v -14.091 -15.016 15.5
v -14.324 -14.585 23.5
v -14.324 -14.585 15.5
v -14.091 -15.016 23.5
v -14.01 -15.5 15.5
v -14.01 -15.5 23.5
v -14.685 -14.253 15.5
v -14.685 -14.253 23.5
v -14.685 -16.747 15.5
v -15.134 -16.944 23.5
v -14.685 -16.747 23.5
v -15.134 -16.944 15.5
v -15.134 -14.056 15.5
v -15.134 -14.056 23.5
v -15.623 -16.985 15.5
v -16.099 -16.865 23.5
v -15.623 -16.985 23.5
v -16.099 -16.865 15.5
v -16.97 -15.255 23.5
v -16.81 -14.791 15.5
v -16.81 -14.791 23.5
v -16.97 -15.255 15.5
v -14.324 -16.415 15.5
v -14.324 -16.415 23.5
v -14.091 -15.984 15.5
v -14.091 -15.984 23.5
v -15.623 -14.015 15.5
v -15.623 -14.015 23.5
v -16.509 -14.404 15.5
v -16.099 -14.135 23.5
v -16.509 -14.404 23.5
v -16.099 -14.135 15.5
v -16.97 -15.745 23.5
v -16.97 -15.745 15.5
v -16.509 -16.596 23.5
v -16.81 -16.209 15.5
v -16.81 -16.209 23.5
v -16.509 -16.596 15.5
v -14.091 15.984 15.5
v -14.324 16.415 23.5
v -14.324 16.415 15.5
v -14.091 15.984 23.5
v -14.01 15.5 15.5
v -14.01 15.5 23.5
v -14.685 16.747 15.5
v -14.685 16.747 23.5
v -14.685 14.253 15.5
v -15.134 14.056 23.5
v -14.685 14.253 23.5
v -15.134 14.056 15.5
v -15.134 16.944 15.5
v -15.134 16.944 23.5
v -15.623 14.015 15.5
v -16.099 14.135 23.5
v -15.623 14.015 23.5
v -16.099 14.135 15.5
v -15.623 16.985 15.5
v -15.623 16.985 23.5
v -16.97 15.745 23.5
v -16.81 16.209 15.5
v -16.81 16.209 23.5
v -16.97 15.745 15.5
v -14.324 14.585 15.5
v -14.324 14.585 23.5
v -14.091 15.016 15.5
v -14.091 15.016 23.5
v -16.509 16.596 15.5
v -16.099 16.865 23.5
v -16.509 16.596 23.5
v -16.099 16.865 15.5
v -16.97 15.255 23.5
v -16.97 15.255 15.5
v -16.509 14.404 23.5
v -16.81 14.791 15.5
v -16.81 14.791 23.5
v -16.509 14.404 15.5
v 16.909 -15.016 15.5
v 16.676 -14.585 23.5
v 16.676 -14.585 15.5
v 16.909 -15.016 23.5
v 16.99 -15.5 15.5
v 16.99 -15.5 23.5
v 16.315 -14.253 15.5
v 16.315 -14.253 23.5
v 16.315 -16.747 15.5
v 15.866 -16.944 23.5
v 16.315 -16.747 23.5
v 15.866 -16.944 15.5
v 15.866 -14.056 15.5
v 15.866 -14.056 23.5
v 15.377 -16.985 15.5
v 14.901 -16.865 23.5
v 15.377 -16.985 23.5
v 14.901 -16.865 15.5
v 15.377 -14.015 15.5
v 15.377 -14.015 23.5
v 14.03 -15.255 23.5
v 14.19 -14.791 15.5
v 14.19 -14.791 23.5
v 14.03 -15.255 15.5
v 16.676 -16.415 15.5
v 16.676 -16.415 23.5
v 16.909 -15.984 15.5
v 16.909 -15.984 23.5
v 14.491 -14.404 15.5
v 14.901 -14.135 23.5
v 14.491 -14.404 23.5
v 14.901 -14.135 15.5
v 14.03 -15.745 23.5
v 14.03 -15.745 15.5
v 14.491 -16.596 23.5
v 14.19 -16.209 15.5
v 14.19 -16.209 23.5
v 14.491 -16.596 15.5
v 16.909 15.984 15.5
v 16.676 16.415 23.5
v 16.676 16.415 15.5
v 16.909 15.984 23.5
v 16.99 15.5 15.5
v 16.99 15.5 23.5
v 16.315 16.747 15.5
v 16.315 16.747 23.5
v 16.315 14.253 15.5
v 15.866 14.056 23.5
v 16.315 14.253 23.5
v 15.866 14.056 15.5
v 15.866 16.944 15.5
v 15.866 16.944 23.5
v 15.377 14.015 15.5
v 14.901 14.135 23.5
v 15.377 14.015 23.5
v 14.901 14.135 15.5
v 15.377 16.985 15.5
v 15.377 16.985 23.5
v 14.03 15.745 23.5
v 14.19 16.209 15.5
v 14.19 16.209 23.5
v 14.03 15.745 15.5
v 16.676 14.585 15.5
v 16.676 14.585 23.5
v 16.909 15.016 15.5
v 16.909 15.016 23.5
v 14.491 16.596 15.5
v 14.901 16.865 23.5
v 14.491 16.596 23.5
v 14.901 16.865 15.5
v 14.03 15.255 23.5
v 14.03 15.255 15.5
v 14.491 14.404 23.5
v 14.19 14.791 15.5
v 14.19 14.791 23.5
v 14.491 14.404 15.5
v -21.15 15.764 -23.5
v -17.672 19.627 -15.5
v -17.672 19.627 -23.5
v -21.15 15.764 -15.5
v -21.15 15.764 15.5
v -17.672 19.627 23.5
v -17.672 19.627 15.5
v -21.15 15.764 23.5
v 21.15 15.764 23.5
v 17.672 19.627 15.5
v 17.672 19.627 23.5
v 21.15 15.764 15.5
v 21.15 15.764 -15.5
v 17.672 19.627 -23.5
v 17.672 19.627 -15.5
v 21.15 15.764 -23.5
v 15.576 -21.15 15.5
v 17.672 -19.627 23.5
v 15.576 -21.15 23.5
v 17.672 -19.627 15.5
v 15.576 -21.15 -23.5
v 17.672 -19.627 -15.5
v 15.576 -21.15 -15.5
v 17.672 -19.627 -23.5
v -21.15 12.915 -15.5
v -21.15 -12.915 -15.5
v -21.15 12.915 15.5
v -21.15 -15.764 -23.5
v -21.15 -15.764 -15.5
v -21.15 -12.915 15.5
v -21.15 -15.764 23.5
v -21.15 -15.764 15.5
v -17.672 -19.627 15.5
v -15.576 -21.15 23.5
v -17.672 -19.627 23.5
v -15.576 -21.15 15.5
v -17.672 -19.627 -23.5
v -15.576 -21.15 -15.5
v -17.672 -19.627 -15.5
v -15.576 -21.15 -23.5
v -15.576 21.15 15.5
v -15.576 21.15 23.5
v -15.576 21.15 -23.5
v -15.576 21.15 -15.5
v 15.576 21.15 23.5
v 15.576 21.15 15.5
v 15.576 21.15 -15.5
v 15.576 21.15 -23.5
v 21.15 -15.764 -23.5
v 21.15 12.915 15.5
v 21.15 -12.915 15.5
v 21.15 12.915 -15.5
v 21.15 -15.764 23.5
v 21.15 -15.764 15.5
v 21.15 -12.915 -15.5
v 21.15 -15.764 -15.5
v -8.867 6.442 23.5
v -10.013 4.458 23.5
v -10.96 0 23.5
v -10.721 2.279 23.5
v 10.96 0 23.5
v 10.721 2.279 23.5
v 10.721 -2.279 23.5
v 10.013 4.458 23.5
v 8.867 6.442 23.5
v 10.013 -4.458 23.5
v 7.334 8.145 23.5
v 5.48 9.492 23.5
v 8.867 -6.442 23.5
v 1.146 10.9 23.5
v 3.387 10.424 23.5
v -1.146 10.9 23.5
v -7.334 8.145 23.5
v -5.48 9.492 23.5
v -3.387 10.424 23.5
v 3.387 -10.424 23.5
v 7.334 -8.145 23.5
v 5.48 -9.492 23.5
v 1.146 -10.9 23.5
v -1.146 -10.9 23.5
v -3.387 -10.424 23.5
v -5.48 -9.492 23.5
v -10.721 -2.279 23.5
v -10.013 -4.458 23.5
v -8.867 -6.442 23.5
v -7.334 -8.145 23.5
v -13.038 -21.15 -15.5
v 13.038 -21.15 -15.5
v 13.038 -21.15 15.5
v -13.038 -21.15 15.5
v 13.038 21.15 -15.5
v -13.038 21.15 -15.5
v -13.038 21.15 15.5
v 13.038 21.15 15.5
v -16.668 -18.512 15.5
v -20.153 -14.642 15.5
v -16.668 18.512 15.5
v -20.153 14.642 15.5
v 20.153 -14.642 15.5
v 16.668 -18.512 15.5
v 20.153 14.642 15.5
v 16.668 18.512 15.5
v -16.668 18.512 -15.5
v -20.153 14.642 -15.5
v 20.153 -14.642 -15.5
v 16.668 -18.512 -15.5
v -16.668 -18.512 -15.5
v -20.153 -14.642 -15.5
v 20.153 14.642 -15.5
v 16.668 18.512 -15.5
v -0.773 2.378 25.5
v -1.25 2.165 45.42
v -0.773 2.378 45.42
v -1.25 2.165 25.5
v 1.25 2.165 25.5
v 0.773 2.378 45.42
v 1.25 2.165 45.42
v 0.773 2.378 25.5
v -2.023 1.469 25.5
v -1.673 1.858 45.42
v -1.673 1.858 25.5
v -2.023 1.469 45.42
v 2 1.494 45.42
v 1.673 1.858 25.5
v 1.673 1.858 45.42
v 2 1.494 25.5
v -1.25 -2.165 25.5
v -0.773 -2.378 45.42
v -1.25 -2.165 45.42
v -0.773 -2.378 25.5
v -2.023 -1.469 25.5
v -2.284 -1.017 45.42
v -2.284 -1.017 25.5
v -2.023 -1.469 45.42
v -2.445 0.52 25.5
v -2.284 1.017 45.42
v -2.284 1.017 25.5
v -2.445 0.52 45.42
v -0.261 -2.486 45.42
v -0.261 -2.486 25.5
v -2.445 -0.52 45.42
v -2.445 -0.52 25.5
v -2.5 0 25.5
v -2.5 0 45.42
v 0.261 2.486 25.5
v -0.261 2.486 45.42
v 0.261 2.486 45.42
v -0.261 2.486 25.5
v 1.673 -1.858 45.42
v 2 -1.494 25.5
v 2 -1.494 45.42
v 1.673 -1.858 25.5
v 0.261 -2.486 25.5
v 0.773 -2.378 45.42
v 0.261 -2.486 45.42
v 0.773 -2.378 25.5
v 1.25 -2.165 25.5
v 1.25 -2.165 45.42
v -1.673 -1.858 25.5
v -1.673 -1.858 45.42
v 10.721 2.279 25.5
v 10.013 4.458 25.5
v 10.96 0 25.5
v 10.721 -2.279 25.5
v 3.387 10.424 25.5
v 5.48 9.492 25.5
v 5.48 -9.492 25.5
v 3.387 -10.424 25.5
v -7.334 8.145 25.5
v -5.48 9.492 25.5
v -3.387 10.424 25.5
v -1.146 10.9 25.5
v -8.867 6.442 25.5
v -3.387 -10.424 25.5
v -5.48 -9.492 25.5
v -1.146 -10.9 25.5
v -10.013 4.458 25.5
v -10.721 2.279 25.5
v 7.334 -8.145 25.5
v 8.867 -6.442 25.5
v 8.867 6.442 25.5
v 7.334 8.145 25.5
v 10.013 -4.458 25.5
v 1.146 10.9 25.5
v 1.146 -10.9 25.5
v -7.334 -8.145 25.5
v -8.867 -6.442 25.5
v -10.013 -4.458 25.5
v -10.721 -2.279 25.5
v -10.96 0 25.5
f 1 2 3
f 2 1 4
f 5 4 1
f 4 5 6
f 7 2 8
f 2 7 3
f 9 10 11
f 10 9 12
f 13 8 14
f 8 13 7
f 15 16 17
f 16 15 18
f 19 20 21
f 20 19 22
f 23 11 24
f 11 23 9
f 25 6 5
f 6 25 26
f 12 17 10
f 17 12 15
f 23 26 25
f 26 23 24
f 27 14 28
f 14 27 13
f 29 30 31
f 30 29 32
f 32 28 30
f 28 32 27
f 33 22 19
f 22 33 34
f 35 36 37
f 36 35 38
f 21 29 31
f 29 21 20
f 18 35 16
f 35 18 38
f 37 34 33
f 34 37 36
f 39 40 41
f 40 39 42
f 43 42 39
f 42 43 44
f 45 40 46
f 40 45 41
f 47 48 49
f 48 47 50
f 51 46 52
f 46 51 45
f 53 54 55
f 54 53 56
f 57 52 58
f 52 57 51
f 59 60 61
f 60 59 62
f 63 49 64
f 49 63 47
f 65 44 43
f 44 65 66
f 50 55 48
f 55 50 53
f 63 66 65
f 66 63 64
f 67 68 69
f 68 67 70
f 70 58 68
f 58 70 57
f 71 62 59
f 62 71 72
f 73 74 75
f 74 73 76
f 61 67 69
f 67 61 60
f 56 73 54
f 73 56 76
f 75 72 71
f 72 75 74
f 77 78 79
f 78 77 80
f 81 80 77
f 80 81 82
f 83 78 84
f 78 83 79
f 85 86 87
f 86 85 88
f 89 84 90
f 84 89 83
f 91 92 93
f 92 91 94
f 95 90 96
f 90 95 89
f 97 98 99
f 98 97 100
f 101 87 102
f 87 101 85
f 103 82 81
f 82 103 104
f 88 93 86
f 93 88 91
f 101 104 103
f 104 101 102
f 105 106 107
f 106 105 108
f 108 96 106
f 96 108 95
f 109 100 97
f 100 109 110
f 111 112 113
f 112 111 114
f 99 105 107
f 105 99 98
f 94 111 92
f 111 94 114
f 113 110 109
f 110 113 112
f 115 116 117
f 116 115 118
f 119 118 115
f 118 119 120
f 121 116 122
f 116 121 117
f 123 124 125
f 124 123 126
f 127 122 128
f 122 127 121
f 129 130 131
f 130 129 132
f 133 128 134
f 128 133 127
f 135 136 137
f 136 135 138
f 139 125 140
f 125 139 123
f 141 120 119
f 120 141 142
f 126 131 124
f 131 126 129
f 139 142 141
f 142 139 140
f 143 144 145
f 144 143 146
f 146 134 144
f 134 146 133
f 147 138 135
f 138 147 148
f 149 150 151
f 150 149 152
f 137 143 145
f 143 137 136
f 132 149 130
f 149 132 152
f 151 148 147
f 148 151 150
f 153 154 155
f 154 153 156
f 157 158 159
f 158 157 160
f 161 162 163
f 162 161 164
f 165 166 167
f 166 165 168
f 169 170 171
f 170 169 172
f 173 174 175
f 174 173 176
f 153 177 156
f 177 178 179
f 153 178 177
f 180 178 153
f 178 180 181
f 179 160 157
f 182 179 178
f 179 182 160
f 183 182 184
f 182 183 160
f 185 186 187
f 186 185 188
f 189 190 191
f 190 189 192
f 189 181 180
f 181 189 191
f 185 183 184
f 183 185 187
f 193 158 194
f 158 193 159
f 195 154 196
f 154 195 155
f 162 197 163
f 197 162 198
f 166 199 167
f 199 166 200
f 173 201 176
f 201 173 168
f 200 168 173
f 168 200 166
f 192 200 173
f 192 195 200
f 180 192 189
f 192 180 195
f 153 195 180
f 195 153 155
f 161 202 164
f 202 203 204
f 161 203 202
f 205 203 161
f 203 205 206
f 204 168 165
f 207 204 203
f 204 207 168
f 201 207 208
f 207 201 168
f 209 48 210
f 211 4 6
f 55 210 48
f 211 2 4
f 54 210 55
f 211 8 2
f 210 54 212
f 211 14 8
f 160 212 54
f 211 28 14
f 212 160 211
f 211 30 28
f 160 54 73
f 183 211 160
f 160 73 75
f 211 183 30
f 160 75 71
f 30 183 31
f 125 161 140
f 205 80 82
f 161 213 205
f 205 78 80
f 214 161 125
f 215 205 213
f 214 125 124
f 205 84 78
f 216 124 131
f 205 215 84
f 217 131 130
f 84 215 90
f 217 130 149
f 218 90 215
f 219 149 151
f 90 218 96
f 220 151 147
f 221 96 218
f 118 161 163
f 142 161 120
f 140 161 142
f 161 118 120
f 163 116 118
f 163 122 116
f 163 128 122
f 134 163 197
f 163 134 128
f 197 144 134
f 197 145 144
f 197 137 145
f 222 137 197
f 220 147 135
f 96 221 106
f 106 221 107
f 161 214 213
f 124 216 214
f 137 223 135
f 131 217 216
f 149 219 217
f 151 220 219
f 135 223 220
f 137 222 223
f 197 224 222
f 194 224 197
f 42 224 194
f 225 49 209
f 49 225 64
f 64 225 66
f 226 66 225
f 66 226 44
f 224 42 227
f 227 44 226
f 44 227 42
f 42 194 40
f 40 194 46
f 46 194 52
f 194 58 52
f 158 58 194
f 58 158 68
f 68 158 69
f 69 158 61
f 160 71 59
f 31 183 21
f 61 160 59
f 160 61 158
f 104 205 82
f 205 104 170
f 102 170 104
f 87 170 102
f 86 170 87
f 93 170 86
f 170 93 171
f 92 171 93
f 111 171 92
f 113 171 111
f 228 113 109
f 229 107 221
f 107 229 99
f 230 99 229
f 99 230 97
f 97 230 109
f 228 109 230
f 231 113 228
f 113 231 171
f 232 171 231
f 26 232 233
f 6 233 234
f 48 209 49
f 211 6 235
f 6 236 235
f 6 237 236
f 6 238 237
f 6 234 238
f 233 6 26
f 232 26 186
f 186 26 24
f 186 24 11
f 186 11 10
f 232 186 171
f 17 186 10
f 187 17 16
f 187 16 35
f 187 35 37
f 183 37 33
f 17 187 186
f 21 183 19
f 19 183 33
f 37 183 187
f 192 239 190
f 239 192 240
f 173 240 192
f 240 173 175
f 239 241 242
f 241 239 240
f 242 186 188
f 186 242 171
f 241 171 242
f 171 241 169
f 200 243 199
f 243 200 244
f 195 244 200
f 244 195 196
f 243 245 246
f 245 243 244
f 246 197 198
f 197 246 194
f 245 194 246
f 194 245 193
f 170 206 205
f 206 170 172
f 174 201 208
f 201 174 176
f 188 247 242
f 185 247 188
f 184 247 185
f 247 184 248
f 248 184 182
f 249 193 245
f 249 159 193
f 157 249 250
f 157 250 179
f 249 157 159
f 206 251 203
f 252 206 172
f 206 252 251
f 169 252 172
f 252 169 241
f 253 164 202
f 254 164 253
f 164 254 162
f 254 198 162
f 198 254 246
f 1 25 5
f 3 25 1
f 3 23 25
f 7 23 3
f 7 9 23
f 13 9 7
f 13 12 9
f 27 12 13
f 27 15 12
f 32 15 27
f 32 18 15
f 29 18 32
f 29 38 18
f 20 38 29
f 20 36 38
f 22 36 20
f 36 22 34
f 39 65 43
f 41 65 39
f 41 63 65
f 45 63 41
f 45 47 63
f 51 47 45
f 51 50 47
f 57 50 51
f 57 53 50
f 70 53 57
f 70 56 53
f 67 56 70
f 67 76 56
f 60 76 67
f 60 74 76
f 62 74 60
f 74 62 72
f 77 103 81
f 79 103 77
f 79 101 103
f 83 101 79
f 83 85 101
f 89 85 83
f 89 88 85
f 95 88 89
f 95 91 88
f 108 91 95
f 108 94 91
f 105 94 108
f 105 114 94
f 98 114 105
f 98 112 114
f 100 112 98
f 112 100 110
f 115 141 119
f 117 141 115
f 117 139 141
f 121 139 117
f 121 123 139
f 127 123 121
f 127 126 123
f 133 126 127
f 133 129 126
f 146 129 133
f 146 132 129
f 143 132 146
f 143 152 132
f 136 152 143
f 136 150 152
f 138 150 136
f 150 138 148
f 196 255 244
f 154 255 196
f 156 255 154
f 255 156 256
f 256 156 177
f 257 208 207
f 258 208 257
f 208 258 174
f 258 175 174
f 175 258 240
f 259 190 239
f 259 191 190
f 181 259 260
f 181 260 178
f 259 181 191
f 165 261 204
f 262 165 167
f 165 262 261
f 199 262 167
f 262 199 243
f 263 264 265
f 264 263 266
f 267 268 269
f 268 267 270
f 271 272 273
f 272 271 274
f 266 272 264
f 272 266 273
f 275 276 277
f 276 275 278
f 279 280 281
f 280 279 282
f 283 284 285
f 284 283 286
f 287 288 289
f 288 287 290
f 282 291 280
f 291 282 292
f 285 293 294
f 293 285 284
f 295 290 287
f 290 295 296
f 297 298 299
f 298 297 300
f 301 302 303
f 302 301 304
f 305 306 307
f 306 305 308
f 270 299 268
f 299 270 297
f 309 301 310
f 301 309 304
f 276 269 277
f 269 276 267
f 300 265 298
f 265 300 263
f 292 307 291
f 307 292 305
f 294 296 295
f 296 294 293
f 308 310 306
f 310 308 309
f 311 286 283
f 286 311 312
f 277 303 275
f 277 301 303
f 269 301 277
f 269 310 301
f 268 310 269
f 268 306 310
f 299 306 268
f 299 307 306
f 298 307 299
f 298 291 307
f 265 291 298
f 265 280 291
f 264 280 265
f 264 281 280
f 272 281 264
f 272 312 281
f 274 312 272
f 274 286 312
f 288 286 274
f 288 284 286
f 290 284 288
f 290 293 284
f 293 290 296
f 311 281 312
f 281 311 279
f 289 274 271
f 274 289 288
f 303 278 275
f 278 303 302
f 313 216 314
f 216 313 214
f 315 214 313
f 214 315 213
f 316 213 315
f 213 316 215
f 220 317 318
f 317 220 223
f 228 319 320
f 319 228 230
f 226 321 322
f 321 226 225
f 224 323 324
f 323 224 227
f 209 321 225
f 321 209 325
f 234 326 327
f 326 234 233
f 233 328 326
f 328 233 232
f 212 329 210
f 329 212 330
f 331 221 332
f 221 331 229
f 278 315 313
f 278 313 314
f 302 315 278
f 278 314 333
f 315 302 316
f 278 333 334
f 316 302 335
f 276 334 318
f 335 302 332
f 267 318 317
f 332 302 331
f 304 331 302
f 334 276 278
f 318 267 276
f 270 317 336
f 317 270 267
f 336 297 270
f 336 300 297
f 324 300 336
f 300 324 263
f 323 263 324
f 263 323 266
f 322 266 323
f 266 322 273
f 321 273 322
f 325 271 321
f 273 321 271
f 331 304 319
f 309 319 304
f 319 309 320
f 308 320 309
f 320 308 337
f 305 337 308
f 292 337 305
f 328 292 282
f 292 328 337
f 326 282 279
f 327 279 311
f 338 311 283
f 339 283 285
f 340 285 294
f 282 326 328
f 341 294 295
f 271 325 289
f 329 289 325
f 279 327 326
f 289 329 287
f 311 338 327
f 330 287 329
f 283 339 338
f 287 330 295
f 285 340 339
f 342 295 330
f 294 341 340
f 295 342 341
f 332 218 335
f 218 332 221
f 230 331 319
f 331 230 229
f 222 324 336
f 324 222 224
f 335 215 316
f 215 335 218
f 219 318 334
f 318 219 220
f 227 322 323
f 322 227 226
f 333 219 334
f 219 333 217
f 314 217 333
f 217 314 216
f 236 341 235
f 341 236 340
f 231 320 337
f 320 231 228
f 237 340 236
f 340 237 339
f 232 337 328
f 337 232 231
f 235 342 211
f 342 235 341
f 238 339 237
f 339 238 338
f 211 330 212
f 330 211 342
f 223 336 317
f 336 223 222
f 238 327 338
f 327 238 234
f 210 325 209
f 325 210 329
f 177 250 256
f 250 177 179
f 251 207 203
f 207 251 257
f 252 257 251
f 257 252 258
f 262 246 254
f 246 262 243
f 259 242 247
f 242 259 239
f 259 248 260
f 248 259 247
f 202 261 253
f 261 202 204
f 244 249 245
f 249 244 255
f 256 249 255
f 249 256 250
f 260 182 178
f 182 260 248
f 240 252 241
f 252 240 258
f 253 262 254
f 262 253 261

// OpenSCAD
// file: ../press_fit.scad
include <config.scad>

module press_fit(d=0, h=0, center=false) {

	linear_extrude(height=h, center=center)
		minkowski() {
			square([d/3,d/3], center=true);
			circle(r=d/3);
		}
}

difference() {
	press_fit(d=20, h=24, center=true);
	cylinder(d=20, h=24+e, center=true);
}
// file: ../standard.scad
BOLT_D = [
	-1, //0 index is not used but reduces computation
	-1,
	-1,
	2.980,	//m3
	3.978,	//m4
	4.976,	//m5
	5.974,	//m6
	-1,
	7.972,	//m8
	-1,
	9.968,	//m10
	-1,
	11.966	//m12
];

NUT_D = [
	-1, //0 index is not used but reduces computation
	-1,
	-1,
	6.40,	//m3
	8.10,	//m4
	9.20,	//m5
	11.50,	//m6
	-1,
	15.00,	//m8
	-1,
	19.60,	//m10
	-1,
	22.10	//m12
];

NUT_H = [
	-1, //0 index is not used but reduces computation
	-1,
	-1,
	2.40,	//m3
	3.20,	//m4
	4.00,	//m5
	5.00,	//m6
	-1,
	6.50,	//m8
	-1,
	8.00,	//m10
	-1,
	10.00	//m12
];

NEMA_F = [	//faceplate size
	-1,-1,-1,-1,-1,-1,-1,-1,-1,-1,-1,
	28.0,	//Nema11
	-1,-1,
	35.6,	//Nema14
	-1,-1,
	42.3,	//Nema17
	-1,-1,-1,-1,-1,
	58.4	//Nema23
];

NEMA_H = [	//halved distance between holes
	-1,-1,-1,-1,-1,-1,-1,-1,-1,-1,-1,
	11.50,	//Nema11
	-1,-1,
	13.00,	//Nema14
	-1,-1,
	15.50,	//Nema17
	-1,-1,-1,-1,-1,
	23.57	//Nema23
];

NEMA_S = [	//shaft diameter
	-1,-1,-1,-1,-1,-1,-1,-1,-1,-1,-1,
	4.0,	//Nema11
	-1,-1,
	5.0,	//Nema14
	-1,-1,
	5.0,	//Nema17
	-1,-1,-1,-1,-1,
	6.35	//Nema23
];
// file: ../config.scad
include <standard.scad>

//render & print
$fs=.5;						//minimum arc segment
e=.1;						//extra length for manfold mesh (do not change)
tol=.5;						//xy compensation for small holes

				//
x=50*cos($t*360);			// printhead position
y=40*sin($t*360);			//
z=50*sin($t*360);

/*
x=0;			// printhead position
y=0;			//
z=0;
*/

wall=5/2;					//(some) thin wall thickness

//frame
f_t=10;						//frame thickness
f_x=200;
f_y=200;
f_z=65;
f_tr=8;						//corner threaded rods ISO diameter 
fy_ko=2;					//keepout between frame and x_carriage

//microswitch
ms_h=6;						//height
ms_l=13;					//length
ms_t=6;						//thickness

//motors
ab_motor=17;				//xy motors
ab_motor_l=47;				//xy motors length
z_motor=17;					//z motor
z_motor_l=47;				//z motor length
z_h=100;
z_h_extra=16.5;

//x
x_d=15;						//bearing diameter
x_l=24;						//bearing length
x_s=8;						//shaft diameter
x_fan=30;					//hotend fan diameter
x_blower=35;				//blower fan diameter
x_fans_m=6;					//fan and blower mount holes spacing

x_fan_duct=28;
x_blower_duct=25;
x_shroud=10;
x_shroud_t=5;
x_shroud_w=2;


//y
y_d=15;						//bearing diameter
y_l=24;						//bearing length
y_s=8;						//shaft diameter
y_shaft_distance_extra=3;	//extra distance between shafts
y_sp=6;						//shaft position (relative to frame)


//z
z_s=8;						//shaft diameter
z_l=24*2;					//bearing length
z_d=15;						//bearing diameter


//idler
idler_d=8;					//groove bearing OD
idler_l=3;					//groove bearing thickness
idler_s=3;					//groove bearing ID

idler_hk=2;					//idler horizontal keepout
idler_vk=.5;				//idler verical keepout (washer thickness?)

//pulley
pulley_d=200/PI/5;			//5 steps per mm (80 with 16x microstepping)
pulley_h=2;
pulley_rivet=1.5;
pulley_flat_shaft=true;

//bed
bed_x=100;
bed_y=100;

// ------
//  math
// ------
pulley_length = pulley_h+4*pulley_rivet+NUT_D[3];
pulley_diameter = pulley_d+pulley_rivet*2;
pulley_wire_height = pulley_h/2+pulley_rivet*2+NUT_D[3];
pulley_screw_length = (pulley_diameter-NEMA_S[17])/2;

y_shaft_distance = NEMA_F[ab_motor]+y_s+y_shaft_distance_extra;

x_shaft_distance = y_shaft_distance-y_d-y_s;

ab_motor_xpos = f_x/2-f_t-y_sp-y_d/2-wall;
ab_motor_ypos = f_y/2-f_t-(NEMA_H[ab_motor]*2+BOLT_D[3])/2+(f_t-f_tr)/2;


z_shaft_distance = bed_x/2-wall;
z_carriage_arm = NEMA_F[ab_motor]/2+y_l/2+x_d/2+wall+x_fan/2;
z_carriage_arm_max = ab_motor_ypos+f_y/2-f_t-x_fan/2;

//COLORS
abs="OrangeRed";
pla="SteelBlue";
shaft="DarkGray";
fan=[.1, .1, .1];
mdf="BurlyWood";

abs_="LightSteelBlue";
bearing_inside=fan;
bearing_outside=shaft;
blower=fan;
e3d="Silver";
heatbed="Silver";
th_rods=shaft;
nema_body=fan;
nema_plate=shaft;


use <press_fit.scad>
// main file
include <../config.scad>


module nema(standard,length) {
	
	color(nema_plate) {
		difference() {
			linear_extrude(height=length, center=true)
				intersection() {
					square([NEMA_F[standard], NEMA_F[standard]],center=true);
					circle(d=NEMA_F[standard]*sqrt(2)-7);
				}			
			cube([NEMA_F[standard]*2, NEMA_F[standard]+e, length-8*2], center=true);
			for(i=[-1,1]) for(j=[-1,1])
				translate([NEMA_H[standard]*i,NEMA_H[standard]*j,0])
					cylinder(d=BOLT_D[3], h=length/2+e);
		}
	
		translate([0,0,length/2]) {
			cylinder(d=NEMA_H[standard]*sqrt(2), h=2);
			difference() {
				cylinder(d=NEMA_S[standard], h=NEMA_H[standard]*sqrt(2));
				rotate([0,0,10*360*$t])
					translate([NEMA_S[standard]/2-.5,-NEMA_S[standard]/2,0])
						cube([NEMA_S[standard]+e,NEMA_S[standard]+e,NEMA_H[standard]*sqrt(2)+e]);
			}
		}
	
	}
	
	color(nema_body)
		linear_extrude(height=length-8*2, center=true)
			intersection() {
				square([NEMA_F[standard], NEMA_F[standard]],center=true);
				circle(d=NEMA_F[standard]*sqrt(2)-10);
			}
}

nema(17,47);
